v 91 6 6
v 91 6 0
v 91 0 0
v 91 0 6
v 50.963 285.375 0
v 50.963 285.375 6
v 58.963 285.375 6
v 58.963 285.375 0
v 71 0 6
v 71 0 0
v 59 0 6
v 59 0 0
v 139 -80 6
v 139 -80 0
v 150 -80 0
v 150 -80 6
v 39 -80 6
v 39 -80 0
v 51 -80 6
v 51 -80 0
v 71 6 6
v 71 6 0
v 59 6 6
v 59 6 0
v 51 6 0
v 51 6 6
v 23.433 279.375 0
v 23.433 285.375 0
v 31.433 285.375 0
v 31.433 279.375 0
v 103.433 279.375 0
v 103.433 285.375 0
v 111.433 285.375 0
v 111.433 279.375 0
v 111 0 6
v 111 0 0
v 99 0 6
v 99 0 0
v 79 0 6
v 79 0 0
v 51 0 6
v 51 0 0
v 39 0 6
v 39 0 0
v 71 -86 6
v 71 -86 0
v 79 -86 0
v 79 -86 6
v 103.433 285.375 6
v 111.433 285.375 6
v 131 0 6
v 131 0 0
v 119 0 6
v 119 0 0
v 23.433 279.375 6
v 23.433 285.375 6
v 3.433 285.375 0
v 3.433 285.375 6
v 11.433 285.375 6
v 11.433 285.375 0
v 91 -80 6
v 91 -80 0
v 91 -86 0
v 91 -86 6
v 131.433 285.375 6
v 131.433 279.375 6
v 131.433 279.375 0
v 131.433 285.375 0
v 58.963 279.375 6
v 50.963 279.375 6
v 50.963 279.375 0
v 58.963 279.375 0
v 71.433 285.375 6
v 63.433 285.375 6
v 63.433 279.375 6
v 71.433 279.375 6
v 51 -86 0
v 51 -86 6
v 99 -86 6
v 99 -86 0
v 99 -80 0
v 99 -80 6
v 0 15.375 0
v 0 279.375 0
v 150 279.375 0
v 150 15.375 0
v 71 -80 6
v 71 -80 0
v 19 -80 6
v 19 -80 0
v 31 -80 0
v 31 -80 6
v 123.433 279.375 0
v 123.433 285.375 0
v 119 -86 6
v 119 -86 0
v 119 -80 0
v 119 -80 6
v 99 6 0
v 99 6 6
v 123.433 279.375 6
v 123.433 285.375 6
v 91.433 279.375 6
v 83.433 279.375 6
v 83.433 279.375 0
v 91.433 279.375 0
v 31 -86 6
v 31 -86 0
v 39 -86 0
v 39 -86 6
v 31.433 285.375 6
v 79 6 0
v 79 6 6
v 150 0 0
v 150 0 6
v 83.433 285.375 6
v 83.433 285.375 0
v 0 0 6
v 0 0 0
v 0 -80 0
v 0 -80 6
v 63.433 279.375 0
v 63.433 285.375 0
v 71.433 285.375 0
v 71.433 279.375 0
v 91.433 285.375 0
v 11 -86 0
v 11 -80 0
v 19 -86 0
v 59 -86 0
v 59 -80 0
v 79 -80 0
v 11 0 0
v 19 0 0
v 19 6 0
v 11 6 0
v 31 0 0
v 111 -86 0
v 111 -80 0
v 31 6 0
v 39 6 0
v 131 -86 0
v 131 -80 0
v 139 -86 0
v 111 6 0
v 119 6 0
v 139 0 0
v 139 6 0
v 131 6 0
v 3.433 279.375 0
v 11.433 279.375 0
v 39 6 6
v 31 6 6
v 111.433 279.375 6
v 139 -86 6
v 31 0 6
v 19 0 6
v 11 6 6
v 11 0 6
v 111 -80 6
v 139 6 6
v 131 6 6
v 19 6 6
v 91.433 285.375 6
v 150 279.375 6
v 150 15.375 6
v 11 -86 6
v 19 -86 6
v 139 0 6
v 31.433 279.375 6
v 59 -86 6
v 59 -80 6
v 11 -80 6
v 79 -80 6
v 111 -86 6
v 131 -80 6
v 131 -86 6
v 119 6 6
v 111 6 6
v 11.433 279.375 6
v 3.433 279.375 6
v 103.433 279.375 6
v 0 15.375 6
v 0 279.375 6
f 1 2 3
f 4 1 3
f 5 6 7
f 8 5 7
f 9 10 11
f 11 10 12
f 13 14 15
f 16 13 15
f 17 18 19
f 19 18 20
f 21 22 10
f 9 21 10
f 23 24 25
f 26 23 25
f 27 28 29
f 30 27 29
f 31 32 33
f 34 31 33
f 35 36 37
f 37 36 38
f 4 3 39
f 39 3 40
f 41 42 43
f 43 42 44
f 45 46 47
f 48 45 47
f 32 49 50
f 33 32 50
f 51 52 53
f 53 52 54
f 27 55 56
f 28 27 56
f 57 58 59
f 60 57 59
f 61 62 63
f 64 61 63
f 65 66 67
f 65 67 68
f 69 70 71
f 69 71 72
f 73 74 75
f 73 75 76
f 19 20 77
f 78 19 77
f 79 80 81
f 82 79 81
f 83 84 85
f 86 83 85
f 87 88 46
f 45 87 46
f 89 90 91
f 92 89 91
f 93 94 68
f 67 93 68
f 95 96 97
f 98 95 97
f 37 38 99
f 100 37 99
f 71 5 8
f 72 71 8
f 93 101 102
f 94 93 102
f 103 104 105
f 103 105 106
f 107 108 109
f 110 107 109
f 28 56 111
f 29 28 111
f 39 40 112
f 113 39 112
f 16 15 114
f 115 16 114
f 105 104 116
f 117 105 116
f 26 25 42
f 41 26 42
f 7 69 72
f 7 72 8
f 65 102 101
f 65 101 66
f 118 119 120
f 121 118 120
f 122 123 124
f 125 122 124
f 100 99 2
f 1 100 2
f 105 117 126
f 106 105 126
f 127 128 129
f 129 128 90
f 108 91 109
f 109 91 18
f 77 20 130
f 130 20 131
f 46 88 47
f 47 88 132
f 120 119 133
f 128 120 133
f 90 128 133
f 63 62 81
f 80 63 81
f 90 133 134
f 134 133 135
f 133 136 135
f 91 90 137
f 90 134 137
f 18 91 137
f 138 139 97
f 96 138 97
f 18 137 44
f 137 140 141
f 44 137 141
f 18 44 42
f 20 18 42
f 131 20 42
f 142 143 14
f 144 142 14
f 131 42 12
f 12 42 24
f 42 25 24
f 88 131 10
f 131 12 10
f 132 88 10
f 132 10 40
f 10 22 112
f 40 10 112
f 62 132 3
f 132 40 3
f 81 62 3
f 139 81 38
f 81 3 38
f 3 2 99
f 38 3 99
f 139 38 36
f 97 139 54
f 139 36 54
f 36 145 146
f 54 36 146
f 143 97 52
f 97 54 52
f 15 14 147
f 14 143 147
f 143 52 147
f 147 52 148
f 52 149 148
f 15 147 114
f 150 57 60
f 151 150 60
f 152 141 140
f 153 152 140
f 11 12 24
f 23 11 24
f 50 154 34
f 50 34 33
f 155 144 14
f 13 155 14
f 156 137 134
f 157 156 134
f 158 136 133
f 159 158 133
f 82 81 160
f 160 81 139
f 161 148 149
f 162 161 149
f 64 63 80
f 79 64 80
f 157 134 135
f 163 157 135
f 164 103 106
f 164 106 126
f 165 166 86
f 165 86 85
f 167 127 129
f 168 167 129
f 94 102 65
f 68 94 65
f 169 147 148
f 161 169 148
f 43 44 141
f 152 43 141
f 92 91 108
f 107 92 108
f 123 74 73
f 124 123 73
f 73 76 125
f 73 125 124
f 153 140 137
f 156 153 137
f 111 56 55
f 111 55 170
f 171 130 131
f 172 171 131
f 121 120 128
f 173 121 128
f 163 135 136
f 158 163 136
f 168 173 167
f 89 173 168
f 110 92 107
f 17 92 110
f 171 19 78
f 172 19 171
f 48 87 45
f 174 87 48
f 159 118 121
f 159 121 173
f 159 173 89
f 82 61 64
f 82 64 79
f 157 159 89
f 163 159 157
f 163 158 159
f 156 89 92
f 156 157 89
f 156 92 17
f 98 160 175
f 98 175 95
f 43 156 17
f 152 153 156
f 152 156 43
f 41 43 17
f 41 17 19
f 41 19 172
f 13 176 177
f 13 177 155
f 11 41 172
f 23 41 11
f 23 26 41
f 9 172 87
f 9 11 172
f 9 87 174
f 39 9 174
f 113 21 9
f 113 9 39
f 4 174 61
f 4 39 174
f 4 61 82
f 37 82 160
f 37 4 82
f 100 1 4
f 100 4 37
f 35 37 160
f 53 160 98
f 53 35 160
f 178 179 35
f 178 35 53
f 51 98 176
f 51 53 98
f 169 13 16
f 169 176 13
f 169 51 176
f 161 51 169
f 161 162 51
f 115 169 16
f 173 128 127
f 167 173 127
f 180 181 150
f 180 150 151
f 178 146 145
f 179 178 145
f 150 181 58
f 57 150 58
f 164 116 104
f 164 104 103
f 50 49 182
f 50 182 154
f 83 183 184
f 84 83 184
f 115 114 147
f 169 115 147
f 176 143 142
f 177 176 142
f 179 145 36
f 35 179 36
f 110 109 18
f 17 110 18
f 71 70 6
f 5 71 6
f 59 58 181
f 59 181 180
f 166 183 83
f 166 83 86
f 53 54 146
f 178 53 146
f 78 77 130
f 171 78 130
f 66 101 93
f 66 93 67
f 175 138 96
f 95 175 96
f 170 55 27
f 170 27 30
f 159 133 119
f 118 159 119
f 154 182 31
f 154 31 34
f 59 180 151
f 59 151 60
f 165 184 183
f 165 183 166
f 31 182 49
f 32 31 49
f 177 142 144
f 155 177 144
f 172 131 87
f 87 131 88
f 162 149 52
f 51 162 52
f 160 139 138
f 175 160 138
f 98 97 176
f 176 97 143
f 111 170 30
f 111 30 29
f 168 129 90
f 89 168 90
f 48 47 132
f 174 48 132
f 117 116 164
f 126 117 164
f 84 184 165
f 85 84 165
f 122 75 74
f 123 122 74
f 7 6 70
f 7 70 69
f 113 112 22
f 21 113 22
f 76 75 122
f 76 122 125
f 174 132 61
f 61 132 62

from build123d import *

# Parameters (mm, degrees)
BOSS_EXTRU_1_DEPTH   = 6
ESQUISSE4_W          = 150
ESQUISSE4_H          = 264
BOSS_EXTRU_2_DEPTH   = 6
ESQUISSE5_W          = 8
ESQUISSE5_H          = 6
BOSS_EXTRU_3_DEPTH   = 6
BOSS_EXTRU_3_2_DEPTH = 6
BOSS_EXTRU_3_3_DEPTH = 6
BOSS_EXTRU_3_4_DEPTH = 6
BOSS_EXTRU_3_5_DEPTH = 6
BOSS_EXTRU_3_6_DEPTH = 6
BOSS_EXTRU_3_7_DEPTH = 6


with BuildPart() as part:
    # Esquisse1 → Boss.-Extru.1 (new body)
    with BuildSketch(Plane.XY):
        Polygon((11, -80), (11, -86), (19, -86), (19, -80), (31, -80), (31, -86), (39, -86), (39, -80), (51, -80), (51, -86), (59, -86), (59, -80), (71, -80), (71, -86), (79, -86), (79, -80), (91, -80), (91, -86), (99, -86), (99, -80), (111, -80), (111, -86), (119, -86), (119, -80), (131, -80), (131, -86), (139, -86), (139, -80), (150, -80), (150, 0), (139, 0), (139, 6), (131, 6), (131, 0), (119, 0), (119, 6), (111, 6), (111, 0), (99, 0), (99, 6), (91, 6), (91, 0), (79, 0), (79, 6), (71, 6), (71, 0), (59, 0), (59, 6), (51, 6), (51, 0), (39, 0), (39, 6), (31, 6), (31, 0), (19, 0), (19, 6), (11, 6), (11, 0), (0, 0), (0, -80), align=None)
    extrude(amount=BOSS_EXTRU_1_DEPTH)


with BuildPart() as body_2:
    # Esquisse4 → Boss.-Extru.2 (new body)
    with BuildSketch(Plane.XY.offset(6)):
        with Locations((75, 147.375370895)):
            Rectangle(ESQUISSE4_W, ESQUISSE4_H)
    extrude(amount=-BOSS_EXTRU_2_DEPTH)


with BuildPart() as body_3:
    # Esquisse5 → Boss.-Extru.3 (new body)
    with BuildSketch(Plane.XY.offset(6)):
        with Locations((7.43305916, 282.375370895)):
            Rectangle(ESQUISSE5_W, ESQUISSE5_H)
    extrude(amount=-BOSS_EXTRU_3_DEPTH)


with BuildPart() as body_4:
    # Esquisse5 → Boss.-Extru.3 2 (new body)
    with BuildSketch(Plane.XY.offset(6)):
        with Locations((27.43305916, 282.375370895)):
            Rectangle(ESQUISSE5_W, ESQUISSE5_H)
    extrude(amount=-BOSS_EXTRU_3_2_DEPTH)


with BuildPart() as body_5:
    # Esquisse5 → Boss.-Extru.3 3 (new body)
    with BuildSketch(Plane.XY.offset(6)):
        with Locations((54.962850026, 282.375370895)):
            Rectangle(ESQUISSE5_W, ESQUISSE5_H)
    extrude(amount=-BOSS_EXTRU_3_3_DEPTH)


with BuildPart() as body_6:
    # Esquisse5 → Boss.-Extru.3 4 (new body)
    with BuildSketch(Plane.XY.offset(6)):
        with Locations((67.43305916, 282.375370895)):
            Rectangle(ESQUISSE5_W, ESQUISSE5_H)
    extrude(amount=-BOSS_EXTRU_3_4_DEPTH)


with BuildPart() as body_7:
    # Esquisse5 → Boss.-Extru.3 5 (new body)
    with BuildSketch(Plane.XY.offset(6)):
        with Locations((87.43305916, 282.375370895)):
            Rectangle(ESQUISSE5_W, ESQUISSE5_H)
    extrude(amount=-BOSS_EXTRU_3_5_DEPTH)


with BuildPart() as body_8:
    # Esquisse5 → Boss.-Extru.3 6 (new body)
    with BuildSketch(Plane.XY.offset(6)):
        with Locations((107.43305916, 282.375370895)):
            Rectangle(ESQUISSE5_W, ESQUISSE5_H)
    extrude(amount=-BOSS_EXTRU_3_6_DEPTH)


with BuildPart() as body_9:
    # Esquisse5 → Boss.-Extru.3 7 (new body)
    with BuildSketch(Plane.XY.offset(6)):
        with Locations((127.43305916, 282.375370895)):
            Rectangle(ESQUISSE5_W, ESQUISSE5_H)
    extrude(amount=-BOSS_EXTRU_3_7_DEPTH)


solid = Compound([part.part, body_2.part, body_3.part, body_4.part, body_5.part, body_6.part, body_7.part, body_8.part, body_9.part])
